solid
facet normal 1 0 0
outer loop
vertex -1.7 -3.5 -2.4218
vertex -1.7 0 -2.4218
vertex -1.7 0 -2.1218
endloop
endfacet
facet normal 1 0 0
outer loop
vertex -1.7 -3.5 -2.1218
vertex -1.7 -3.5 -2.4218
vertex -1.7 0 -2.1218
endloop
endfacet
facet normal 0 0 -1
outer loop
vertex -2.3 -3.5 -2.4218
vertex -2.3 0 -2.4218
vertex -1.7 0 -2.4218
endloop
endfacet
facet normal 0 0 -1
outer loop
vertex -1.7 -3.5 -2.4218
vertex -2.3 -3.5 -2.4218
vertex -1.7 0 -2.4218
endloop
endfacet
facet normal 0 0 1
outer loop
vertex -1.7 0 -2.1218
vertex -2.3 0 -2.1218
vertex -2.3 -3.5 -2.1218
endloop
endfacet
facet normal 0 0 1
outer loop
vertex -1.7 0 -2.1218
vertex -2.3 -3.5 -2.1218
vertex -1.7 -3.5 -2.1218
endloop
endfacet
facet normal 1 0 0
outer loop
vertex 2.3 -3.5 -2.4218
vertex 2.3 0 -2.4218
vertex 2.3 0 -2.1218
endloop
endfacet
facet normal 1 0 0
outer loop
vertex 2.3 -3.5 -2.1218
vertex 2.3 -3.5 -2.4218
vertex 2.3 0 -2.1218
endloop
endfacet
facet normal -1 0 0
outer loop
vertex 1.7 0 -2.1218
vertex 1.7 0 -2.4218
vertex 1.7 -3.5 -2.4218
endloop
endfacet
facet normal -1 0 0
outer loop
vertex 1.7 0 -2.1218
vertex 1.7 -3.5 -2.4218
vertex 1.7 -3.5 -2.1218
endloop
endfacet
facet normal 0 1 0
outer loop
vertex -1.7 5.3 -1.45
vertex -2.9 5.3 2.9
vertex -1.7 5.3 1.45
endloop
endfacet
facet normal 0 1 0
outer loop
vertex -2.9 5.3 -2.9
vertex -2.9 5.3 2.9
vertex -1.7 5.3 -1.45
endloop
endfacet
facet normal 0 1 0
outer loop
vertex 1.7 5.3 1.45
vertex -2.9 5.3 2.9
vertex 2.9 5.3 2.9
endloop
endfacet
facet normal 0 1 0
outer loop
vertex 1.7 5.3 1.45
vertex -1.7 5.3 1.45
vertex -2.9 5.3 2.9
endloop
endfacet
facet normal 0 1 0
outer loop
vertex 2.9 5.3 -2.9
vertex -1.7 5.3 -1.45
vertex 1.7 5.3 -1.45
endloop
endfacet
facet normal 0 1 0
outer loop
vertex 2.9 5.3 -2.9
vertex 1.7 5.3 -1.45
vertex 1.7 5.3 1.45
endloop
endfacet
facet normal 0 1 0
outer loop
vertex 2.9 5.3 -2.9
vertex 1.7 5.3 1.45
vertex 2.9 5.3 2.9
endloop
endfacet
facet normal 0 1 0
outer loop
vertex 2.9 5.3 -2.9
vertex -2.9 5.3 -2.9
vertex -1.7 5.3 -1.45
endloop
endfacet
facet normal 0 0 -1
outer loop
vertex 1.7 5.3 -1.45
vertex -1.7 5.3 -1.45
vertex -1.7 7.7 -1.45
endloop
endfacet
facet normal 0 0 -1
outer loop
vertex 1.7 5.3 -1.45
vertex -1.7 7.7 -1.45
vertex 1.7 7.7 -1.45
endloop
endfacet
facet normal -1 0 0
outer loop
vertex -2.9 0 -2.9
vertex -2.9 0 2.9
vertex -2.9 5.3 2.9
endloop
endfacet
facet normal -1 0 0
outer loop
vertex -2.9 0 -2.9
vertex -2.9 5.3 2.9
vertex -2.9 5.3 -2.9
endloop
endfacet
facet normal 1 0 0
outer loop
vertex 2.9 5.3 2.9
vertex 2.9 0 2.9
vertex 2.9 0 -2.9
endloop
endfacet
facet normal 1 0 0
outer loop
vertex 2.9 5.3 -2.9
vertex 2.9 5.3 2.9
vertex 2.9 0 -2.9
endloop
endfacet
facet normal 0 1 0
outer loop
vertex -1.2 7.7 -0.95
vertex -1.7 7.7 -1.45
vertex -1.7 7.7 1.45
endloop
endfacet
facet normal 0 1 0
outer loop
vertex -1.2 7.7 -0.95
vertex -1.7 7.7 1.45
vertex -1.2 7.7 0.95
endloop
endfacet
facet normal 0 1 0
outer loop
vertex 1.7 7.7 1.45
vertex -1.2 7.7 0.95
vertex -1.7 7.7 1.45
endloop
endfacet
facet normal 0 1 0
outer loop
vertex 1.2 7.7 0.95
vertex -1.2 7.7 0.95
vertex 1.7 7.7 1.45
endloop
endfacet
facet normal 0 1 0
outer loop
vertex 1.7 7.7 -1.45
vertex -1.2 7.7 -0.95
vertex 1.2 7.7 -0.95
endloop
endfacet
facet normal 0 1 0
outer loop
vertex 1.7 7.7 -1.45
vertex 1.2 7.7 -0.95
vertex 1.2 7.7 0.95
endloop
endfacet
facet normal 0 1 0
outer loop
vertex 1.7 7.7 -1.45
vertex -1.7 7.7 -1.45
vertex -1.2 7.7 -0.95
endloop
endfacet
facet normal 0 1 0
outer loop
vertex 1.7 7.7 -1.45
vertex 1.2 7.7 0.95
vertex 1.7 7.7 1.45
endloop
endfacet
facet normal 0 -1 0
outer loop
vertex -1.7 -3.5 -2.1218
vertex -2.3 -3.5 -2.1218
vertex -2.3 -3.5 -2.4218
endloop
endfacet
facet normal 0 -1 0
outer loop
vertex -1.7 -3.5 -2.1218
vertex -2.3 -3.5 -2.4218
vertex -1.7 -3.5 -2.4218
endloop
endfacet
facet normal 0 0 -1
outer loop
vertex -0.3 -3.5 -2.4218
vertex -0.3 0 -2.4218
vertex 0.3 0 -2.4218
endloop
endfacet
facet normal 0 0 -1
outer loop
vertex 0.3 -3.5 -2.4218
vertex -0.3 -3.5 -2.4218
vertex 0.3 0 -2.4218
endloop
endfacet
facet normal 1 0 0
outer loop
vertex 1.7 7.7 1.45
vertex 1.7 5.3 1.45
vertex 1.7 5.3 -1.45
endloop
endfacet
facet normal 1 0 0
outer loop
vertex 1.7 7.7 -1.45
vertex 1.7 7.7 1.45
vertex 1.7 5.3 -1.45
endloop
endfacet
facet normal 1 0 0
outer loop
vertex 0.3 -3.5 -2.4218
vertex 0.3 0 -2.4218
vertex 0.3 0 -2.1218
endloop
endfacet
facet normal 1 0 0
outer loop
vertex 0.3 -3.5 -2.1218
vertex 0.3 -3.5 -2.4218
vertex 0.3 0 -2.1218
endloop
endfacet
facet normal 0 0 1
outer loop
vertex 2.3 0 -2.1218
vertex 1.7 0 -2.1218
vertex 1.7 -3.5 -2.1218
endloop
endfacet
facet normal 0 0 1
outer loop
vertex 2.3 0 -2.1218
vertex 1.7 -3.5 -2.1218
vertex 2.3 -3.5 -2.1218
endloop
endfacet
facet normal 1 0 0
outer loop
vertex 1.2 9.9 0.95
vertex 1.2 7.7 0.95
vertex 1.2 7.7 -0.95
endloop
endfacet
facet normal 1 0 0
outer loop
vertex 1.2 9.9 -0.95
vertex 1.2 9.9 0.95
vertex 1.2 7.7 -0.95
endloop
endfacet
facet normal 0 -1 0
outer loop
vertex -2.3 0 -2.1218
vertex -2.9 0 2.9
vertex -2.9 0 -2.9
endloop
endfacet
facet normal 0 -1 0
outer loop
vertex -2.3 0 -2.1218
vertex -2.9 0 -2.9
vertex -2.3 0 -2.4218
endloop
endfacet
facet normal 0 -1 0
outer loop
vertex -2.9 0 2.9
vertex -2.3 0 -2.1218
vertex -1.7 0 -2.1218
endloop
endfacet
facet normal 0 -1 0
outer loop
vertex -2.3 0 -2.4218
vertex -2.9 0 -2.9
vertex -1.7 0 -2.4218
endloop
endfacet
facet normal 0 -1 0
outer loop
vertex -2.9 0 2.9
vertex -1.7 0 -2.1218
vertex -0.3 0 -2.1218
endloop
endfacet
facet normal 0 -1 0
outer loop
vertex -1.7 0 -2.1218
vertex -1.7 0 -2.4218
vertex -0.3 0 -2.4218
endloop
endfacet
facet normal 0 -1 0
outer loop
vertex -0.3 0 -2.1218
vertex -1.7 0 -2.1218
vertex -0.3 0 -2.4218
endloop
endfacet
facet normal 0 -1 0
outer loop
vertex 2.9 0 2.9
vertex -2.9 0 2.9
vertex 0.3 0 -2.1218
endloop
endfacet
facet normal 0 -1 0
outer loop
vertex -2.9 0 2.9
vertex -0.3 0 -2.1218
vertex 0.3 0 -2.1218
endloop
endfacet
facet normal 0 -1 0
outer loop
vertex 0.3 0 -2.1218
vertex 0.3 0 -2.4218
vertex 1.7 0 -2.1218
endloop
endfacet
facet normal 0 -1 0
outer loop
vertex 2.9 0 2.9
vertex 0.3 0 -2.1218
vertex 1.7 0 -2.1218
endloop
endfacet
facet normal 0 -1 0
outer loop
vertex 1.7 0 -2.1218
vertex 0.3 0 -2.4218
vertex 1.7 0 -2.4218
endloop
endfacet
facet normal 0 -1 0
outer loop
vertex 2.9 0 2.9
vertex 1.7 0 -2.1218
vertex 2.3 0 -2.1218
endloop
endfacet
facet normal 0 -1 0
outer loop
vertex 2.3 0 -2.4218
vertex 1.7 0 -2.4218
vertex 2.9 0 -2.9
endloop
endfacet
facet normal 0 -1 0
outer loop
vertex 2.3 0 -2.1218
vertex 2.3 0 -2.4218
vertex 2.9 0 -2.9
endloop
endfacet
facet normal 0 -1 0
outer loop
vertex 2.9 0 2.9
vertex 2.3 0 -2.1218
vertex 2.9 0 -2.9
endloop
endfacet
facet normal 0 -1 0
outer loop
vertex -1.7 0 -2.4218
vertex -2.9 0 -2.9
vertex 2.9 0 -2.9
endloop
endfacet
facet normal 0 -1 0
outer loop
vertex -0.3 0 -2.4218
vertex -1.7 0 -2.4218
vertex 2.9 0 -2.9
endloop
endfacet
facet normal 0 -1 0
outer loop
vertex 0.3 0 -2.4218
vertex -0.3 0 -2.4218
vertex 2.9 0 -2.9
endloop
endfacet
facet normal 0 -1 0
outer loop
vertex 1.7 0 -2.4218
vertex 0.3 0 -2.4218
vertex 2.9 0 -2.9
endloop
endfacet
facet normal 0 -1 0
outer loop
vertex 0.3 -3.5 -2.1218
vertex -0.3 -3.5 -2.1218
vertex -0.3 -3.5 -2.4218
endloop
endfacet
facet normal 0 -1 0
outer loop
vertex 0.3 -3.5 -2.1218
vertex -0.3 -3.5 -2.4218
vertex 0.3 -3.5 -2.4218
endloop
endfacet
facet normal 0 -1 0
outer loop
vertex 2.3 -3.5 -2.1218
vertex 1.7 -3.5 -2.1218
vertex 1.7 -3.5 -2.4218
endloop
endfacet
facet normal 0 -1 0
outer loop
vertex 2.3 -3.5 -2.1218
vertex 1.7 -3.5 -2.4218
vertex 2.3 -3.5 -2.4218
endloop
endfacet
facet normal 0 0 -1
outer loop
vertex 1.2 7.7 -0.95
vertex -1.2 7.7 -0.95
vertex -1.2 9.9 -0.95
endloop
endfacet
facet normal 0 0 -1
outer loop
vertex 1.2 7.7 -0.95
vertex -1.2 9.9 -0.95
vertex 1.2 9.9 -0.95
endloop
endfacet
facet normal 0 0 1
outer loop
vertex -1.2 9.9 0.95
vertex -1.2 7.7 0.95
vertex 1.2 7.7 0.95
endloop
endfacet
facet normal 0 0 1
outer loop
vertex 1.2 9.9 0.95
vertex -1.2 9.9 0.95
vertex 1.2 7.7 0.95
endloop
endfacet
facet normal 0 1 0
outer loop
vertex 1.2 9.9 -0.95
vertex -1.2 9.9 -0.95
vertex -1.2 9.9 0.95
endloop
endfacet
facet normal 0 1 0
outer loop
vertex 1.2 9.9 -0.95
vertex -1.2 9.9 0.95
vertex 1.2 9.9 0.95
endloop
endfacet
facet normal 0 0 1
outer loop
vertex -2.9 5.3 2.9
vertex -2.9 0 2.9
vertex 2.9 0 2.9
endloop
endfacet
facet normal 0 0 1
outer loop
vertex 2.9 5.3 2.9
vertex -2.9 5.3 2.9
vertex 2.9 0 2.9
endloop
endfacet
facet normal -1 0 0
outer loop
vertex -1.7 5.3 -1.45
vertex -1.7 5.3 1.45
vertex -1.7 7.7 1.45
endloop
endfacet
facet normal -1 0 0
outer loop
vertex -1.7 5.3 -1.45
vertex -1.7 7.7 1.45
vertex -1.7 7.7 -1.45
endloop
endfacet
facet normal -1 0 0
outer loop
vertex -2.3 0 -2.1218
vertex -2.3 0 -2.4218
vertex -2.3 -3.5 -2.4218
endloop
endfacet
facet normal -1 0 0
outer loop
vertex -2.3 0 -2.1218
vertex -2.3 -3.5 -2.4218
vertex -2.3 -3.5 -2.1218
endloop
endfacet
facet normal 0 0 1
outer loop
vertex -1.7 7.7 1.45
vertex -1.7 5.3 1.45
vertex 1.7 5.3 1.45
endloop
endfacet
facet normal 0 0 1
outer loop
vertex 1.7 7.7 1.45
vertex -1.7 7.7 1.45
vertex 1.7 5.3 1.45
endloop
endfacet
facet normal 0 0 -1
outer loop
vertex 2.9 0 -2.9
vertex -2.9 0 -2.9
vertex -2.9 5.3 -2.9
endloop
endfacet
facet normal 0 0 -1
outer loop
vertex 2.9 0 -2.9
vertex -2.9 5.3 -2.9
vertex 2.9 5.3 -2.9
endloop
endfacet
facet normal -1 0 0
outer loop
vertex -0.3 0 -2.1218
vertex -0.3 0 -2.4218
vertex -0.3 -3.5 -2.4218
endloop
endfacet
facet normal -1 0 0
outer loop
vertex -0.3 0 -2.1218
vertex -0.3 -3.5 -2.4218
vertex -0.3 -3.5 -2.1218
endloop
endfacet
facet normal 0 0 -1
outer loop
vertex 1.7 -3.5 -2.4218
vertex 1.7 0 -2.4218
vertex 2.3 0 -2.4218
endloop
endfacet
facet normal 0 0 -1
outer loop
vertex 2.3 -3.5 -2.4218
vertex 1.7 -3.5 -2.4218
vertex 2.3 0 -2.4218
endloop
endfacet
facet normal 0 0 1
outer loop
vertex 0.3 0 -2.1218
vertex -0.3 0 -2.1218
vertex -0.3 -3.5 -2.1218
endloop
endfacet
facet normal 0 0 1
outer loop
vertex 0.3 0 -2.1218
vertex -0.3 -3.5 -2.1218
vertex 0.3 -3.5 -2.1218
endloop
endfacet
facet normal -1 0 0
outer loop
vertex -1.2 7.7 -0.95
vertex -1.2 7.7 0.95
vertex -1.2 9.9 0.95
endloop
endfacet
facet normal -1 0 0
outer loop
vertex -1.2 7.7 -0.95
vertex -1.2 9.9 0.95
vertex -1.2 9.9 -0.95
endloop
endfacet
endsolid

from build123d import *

# Parameters (mm, degrees)
ESQUISSE1_W        = 5.8
ESQUISSE1_H        = 5.8
BOSS_EXTRU_1_DEPTH = 5.3
ESQUISSE2_W        = 3.4
ESQUISSE2_H        = 2.9
BOSS_EXTRU_2_DEPTH = 2.4
ESQUISSE4_W        = 2.4
ESQUISSE4_H        = 1.9
BOSS_EXTRU_3_DEPTH = 2.2
ESQUISSE5_W        = 0.6
ESQUISSE5_H        = 0.3
BOSS_EXTRU_4_DEPTH = 3.5


with BuildPart() as part:
    # Esquisse1 → Boss.-Extru.1 (new body)
    with BuildSketch(Plane(origin=(0, 0, 0), x_dir=(1, 0, 0), z_dir=(0, 1, 0))):
        Rectangle(ESQUISSE1_W, ESQUISSE1_H)
    extrude(amount=BOSS_EXTRU_1_DEPTH)

    # Esquisse2 → Boss.-Extru.2 (add)
    with BuildSketch(Plane(origin=(0, 5.3, 0), x_dir=(1, 0, 0), z_dir=(0, 1, 0))):
        Rectangle(ESQUISSE2_W, ESQUISSE2_H)
    extrude(amount=BOSS_EXTRU_2_DEPTH)

    # Esquisse4 → Boss.-Extru.3 (add)
    with BuildSketch(Plane(origin=(0, 7.7, 0), x_dir=(1, 0, 0), z_dir=(0, 1, 0))):
        Rectangle(ESQUISSE4_W, ESQUISSE4_H)
    extrude(amount=BOSS_EXTRU_3_DEPTH)

    # Esquisse5 → Boss.-Extru.4 (add)
    with BuildSketch(Plane.XZ):
        with Locations((0, -2.271834071)):
            Rectangle(ESQUISSE5_W, ESQUISSE5_H)
        with Locations((-2, -2.271834071)):
            Rectangle(ESQUISSE5_W, ESQUISSE5_H)
        with Locations((2, -2.271834071)):
            Rectangle(ESQUISSE5_W, ESQUISSE5_H)
    extrude(amount=BOSS_EXTRU_4_DEPTH)


solid = part.part
